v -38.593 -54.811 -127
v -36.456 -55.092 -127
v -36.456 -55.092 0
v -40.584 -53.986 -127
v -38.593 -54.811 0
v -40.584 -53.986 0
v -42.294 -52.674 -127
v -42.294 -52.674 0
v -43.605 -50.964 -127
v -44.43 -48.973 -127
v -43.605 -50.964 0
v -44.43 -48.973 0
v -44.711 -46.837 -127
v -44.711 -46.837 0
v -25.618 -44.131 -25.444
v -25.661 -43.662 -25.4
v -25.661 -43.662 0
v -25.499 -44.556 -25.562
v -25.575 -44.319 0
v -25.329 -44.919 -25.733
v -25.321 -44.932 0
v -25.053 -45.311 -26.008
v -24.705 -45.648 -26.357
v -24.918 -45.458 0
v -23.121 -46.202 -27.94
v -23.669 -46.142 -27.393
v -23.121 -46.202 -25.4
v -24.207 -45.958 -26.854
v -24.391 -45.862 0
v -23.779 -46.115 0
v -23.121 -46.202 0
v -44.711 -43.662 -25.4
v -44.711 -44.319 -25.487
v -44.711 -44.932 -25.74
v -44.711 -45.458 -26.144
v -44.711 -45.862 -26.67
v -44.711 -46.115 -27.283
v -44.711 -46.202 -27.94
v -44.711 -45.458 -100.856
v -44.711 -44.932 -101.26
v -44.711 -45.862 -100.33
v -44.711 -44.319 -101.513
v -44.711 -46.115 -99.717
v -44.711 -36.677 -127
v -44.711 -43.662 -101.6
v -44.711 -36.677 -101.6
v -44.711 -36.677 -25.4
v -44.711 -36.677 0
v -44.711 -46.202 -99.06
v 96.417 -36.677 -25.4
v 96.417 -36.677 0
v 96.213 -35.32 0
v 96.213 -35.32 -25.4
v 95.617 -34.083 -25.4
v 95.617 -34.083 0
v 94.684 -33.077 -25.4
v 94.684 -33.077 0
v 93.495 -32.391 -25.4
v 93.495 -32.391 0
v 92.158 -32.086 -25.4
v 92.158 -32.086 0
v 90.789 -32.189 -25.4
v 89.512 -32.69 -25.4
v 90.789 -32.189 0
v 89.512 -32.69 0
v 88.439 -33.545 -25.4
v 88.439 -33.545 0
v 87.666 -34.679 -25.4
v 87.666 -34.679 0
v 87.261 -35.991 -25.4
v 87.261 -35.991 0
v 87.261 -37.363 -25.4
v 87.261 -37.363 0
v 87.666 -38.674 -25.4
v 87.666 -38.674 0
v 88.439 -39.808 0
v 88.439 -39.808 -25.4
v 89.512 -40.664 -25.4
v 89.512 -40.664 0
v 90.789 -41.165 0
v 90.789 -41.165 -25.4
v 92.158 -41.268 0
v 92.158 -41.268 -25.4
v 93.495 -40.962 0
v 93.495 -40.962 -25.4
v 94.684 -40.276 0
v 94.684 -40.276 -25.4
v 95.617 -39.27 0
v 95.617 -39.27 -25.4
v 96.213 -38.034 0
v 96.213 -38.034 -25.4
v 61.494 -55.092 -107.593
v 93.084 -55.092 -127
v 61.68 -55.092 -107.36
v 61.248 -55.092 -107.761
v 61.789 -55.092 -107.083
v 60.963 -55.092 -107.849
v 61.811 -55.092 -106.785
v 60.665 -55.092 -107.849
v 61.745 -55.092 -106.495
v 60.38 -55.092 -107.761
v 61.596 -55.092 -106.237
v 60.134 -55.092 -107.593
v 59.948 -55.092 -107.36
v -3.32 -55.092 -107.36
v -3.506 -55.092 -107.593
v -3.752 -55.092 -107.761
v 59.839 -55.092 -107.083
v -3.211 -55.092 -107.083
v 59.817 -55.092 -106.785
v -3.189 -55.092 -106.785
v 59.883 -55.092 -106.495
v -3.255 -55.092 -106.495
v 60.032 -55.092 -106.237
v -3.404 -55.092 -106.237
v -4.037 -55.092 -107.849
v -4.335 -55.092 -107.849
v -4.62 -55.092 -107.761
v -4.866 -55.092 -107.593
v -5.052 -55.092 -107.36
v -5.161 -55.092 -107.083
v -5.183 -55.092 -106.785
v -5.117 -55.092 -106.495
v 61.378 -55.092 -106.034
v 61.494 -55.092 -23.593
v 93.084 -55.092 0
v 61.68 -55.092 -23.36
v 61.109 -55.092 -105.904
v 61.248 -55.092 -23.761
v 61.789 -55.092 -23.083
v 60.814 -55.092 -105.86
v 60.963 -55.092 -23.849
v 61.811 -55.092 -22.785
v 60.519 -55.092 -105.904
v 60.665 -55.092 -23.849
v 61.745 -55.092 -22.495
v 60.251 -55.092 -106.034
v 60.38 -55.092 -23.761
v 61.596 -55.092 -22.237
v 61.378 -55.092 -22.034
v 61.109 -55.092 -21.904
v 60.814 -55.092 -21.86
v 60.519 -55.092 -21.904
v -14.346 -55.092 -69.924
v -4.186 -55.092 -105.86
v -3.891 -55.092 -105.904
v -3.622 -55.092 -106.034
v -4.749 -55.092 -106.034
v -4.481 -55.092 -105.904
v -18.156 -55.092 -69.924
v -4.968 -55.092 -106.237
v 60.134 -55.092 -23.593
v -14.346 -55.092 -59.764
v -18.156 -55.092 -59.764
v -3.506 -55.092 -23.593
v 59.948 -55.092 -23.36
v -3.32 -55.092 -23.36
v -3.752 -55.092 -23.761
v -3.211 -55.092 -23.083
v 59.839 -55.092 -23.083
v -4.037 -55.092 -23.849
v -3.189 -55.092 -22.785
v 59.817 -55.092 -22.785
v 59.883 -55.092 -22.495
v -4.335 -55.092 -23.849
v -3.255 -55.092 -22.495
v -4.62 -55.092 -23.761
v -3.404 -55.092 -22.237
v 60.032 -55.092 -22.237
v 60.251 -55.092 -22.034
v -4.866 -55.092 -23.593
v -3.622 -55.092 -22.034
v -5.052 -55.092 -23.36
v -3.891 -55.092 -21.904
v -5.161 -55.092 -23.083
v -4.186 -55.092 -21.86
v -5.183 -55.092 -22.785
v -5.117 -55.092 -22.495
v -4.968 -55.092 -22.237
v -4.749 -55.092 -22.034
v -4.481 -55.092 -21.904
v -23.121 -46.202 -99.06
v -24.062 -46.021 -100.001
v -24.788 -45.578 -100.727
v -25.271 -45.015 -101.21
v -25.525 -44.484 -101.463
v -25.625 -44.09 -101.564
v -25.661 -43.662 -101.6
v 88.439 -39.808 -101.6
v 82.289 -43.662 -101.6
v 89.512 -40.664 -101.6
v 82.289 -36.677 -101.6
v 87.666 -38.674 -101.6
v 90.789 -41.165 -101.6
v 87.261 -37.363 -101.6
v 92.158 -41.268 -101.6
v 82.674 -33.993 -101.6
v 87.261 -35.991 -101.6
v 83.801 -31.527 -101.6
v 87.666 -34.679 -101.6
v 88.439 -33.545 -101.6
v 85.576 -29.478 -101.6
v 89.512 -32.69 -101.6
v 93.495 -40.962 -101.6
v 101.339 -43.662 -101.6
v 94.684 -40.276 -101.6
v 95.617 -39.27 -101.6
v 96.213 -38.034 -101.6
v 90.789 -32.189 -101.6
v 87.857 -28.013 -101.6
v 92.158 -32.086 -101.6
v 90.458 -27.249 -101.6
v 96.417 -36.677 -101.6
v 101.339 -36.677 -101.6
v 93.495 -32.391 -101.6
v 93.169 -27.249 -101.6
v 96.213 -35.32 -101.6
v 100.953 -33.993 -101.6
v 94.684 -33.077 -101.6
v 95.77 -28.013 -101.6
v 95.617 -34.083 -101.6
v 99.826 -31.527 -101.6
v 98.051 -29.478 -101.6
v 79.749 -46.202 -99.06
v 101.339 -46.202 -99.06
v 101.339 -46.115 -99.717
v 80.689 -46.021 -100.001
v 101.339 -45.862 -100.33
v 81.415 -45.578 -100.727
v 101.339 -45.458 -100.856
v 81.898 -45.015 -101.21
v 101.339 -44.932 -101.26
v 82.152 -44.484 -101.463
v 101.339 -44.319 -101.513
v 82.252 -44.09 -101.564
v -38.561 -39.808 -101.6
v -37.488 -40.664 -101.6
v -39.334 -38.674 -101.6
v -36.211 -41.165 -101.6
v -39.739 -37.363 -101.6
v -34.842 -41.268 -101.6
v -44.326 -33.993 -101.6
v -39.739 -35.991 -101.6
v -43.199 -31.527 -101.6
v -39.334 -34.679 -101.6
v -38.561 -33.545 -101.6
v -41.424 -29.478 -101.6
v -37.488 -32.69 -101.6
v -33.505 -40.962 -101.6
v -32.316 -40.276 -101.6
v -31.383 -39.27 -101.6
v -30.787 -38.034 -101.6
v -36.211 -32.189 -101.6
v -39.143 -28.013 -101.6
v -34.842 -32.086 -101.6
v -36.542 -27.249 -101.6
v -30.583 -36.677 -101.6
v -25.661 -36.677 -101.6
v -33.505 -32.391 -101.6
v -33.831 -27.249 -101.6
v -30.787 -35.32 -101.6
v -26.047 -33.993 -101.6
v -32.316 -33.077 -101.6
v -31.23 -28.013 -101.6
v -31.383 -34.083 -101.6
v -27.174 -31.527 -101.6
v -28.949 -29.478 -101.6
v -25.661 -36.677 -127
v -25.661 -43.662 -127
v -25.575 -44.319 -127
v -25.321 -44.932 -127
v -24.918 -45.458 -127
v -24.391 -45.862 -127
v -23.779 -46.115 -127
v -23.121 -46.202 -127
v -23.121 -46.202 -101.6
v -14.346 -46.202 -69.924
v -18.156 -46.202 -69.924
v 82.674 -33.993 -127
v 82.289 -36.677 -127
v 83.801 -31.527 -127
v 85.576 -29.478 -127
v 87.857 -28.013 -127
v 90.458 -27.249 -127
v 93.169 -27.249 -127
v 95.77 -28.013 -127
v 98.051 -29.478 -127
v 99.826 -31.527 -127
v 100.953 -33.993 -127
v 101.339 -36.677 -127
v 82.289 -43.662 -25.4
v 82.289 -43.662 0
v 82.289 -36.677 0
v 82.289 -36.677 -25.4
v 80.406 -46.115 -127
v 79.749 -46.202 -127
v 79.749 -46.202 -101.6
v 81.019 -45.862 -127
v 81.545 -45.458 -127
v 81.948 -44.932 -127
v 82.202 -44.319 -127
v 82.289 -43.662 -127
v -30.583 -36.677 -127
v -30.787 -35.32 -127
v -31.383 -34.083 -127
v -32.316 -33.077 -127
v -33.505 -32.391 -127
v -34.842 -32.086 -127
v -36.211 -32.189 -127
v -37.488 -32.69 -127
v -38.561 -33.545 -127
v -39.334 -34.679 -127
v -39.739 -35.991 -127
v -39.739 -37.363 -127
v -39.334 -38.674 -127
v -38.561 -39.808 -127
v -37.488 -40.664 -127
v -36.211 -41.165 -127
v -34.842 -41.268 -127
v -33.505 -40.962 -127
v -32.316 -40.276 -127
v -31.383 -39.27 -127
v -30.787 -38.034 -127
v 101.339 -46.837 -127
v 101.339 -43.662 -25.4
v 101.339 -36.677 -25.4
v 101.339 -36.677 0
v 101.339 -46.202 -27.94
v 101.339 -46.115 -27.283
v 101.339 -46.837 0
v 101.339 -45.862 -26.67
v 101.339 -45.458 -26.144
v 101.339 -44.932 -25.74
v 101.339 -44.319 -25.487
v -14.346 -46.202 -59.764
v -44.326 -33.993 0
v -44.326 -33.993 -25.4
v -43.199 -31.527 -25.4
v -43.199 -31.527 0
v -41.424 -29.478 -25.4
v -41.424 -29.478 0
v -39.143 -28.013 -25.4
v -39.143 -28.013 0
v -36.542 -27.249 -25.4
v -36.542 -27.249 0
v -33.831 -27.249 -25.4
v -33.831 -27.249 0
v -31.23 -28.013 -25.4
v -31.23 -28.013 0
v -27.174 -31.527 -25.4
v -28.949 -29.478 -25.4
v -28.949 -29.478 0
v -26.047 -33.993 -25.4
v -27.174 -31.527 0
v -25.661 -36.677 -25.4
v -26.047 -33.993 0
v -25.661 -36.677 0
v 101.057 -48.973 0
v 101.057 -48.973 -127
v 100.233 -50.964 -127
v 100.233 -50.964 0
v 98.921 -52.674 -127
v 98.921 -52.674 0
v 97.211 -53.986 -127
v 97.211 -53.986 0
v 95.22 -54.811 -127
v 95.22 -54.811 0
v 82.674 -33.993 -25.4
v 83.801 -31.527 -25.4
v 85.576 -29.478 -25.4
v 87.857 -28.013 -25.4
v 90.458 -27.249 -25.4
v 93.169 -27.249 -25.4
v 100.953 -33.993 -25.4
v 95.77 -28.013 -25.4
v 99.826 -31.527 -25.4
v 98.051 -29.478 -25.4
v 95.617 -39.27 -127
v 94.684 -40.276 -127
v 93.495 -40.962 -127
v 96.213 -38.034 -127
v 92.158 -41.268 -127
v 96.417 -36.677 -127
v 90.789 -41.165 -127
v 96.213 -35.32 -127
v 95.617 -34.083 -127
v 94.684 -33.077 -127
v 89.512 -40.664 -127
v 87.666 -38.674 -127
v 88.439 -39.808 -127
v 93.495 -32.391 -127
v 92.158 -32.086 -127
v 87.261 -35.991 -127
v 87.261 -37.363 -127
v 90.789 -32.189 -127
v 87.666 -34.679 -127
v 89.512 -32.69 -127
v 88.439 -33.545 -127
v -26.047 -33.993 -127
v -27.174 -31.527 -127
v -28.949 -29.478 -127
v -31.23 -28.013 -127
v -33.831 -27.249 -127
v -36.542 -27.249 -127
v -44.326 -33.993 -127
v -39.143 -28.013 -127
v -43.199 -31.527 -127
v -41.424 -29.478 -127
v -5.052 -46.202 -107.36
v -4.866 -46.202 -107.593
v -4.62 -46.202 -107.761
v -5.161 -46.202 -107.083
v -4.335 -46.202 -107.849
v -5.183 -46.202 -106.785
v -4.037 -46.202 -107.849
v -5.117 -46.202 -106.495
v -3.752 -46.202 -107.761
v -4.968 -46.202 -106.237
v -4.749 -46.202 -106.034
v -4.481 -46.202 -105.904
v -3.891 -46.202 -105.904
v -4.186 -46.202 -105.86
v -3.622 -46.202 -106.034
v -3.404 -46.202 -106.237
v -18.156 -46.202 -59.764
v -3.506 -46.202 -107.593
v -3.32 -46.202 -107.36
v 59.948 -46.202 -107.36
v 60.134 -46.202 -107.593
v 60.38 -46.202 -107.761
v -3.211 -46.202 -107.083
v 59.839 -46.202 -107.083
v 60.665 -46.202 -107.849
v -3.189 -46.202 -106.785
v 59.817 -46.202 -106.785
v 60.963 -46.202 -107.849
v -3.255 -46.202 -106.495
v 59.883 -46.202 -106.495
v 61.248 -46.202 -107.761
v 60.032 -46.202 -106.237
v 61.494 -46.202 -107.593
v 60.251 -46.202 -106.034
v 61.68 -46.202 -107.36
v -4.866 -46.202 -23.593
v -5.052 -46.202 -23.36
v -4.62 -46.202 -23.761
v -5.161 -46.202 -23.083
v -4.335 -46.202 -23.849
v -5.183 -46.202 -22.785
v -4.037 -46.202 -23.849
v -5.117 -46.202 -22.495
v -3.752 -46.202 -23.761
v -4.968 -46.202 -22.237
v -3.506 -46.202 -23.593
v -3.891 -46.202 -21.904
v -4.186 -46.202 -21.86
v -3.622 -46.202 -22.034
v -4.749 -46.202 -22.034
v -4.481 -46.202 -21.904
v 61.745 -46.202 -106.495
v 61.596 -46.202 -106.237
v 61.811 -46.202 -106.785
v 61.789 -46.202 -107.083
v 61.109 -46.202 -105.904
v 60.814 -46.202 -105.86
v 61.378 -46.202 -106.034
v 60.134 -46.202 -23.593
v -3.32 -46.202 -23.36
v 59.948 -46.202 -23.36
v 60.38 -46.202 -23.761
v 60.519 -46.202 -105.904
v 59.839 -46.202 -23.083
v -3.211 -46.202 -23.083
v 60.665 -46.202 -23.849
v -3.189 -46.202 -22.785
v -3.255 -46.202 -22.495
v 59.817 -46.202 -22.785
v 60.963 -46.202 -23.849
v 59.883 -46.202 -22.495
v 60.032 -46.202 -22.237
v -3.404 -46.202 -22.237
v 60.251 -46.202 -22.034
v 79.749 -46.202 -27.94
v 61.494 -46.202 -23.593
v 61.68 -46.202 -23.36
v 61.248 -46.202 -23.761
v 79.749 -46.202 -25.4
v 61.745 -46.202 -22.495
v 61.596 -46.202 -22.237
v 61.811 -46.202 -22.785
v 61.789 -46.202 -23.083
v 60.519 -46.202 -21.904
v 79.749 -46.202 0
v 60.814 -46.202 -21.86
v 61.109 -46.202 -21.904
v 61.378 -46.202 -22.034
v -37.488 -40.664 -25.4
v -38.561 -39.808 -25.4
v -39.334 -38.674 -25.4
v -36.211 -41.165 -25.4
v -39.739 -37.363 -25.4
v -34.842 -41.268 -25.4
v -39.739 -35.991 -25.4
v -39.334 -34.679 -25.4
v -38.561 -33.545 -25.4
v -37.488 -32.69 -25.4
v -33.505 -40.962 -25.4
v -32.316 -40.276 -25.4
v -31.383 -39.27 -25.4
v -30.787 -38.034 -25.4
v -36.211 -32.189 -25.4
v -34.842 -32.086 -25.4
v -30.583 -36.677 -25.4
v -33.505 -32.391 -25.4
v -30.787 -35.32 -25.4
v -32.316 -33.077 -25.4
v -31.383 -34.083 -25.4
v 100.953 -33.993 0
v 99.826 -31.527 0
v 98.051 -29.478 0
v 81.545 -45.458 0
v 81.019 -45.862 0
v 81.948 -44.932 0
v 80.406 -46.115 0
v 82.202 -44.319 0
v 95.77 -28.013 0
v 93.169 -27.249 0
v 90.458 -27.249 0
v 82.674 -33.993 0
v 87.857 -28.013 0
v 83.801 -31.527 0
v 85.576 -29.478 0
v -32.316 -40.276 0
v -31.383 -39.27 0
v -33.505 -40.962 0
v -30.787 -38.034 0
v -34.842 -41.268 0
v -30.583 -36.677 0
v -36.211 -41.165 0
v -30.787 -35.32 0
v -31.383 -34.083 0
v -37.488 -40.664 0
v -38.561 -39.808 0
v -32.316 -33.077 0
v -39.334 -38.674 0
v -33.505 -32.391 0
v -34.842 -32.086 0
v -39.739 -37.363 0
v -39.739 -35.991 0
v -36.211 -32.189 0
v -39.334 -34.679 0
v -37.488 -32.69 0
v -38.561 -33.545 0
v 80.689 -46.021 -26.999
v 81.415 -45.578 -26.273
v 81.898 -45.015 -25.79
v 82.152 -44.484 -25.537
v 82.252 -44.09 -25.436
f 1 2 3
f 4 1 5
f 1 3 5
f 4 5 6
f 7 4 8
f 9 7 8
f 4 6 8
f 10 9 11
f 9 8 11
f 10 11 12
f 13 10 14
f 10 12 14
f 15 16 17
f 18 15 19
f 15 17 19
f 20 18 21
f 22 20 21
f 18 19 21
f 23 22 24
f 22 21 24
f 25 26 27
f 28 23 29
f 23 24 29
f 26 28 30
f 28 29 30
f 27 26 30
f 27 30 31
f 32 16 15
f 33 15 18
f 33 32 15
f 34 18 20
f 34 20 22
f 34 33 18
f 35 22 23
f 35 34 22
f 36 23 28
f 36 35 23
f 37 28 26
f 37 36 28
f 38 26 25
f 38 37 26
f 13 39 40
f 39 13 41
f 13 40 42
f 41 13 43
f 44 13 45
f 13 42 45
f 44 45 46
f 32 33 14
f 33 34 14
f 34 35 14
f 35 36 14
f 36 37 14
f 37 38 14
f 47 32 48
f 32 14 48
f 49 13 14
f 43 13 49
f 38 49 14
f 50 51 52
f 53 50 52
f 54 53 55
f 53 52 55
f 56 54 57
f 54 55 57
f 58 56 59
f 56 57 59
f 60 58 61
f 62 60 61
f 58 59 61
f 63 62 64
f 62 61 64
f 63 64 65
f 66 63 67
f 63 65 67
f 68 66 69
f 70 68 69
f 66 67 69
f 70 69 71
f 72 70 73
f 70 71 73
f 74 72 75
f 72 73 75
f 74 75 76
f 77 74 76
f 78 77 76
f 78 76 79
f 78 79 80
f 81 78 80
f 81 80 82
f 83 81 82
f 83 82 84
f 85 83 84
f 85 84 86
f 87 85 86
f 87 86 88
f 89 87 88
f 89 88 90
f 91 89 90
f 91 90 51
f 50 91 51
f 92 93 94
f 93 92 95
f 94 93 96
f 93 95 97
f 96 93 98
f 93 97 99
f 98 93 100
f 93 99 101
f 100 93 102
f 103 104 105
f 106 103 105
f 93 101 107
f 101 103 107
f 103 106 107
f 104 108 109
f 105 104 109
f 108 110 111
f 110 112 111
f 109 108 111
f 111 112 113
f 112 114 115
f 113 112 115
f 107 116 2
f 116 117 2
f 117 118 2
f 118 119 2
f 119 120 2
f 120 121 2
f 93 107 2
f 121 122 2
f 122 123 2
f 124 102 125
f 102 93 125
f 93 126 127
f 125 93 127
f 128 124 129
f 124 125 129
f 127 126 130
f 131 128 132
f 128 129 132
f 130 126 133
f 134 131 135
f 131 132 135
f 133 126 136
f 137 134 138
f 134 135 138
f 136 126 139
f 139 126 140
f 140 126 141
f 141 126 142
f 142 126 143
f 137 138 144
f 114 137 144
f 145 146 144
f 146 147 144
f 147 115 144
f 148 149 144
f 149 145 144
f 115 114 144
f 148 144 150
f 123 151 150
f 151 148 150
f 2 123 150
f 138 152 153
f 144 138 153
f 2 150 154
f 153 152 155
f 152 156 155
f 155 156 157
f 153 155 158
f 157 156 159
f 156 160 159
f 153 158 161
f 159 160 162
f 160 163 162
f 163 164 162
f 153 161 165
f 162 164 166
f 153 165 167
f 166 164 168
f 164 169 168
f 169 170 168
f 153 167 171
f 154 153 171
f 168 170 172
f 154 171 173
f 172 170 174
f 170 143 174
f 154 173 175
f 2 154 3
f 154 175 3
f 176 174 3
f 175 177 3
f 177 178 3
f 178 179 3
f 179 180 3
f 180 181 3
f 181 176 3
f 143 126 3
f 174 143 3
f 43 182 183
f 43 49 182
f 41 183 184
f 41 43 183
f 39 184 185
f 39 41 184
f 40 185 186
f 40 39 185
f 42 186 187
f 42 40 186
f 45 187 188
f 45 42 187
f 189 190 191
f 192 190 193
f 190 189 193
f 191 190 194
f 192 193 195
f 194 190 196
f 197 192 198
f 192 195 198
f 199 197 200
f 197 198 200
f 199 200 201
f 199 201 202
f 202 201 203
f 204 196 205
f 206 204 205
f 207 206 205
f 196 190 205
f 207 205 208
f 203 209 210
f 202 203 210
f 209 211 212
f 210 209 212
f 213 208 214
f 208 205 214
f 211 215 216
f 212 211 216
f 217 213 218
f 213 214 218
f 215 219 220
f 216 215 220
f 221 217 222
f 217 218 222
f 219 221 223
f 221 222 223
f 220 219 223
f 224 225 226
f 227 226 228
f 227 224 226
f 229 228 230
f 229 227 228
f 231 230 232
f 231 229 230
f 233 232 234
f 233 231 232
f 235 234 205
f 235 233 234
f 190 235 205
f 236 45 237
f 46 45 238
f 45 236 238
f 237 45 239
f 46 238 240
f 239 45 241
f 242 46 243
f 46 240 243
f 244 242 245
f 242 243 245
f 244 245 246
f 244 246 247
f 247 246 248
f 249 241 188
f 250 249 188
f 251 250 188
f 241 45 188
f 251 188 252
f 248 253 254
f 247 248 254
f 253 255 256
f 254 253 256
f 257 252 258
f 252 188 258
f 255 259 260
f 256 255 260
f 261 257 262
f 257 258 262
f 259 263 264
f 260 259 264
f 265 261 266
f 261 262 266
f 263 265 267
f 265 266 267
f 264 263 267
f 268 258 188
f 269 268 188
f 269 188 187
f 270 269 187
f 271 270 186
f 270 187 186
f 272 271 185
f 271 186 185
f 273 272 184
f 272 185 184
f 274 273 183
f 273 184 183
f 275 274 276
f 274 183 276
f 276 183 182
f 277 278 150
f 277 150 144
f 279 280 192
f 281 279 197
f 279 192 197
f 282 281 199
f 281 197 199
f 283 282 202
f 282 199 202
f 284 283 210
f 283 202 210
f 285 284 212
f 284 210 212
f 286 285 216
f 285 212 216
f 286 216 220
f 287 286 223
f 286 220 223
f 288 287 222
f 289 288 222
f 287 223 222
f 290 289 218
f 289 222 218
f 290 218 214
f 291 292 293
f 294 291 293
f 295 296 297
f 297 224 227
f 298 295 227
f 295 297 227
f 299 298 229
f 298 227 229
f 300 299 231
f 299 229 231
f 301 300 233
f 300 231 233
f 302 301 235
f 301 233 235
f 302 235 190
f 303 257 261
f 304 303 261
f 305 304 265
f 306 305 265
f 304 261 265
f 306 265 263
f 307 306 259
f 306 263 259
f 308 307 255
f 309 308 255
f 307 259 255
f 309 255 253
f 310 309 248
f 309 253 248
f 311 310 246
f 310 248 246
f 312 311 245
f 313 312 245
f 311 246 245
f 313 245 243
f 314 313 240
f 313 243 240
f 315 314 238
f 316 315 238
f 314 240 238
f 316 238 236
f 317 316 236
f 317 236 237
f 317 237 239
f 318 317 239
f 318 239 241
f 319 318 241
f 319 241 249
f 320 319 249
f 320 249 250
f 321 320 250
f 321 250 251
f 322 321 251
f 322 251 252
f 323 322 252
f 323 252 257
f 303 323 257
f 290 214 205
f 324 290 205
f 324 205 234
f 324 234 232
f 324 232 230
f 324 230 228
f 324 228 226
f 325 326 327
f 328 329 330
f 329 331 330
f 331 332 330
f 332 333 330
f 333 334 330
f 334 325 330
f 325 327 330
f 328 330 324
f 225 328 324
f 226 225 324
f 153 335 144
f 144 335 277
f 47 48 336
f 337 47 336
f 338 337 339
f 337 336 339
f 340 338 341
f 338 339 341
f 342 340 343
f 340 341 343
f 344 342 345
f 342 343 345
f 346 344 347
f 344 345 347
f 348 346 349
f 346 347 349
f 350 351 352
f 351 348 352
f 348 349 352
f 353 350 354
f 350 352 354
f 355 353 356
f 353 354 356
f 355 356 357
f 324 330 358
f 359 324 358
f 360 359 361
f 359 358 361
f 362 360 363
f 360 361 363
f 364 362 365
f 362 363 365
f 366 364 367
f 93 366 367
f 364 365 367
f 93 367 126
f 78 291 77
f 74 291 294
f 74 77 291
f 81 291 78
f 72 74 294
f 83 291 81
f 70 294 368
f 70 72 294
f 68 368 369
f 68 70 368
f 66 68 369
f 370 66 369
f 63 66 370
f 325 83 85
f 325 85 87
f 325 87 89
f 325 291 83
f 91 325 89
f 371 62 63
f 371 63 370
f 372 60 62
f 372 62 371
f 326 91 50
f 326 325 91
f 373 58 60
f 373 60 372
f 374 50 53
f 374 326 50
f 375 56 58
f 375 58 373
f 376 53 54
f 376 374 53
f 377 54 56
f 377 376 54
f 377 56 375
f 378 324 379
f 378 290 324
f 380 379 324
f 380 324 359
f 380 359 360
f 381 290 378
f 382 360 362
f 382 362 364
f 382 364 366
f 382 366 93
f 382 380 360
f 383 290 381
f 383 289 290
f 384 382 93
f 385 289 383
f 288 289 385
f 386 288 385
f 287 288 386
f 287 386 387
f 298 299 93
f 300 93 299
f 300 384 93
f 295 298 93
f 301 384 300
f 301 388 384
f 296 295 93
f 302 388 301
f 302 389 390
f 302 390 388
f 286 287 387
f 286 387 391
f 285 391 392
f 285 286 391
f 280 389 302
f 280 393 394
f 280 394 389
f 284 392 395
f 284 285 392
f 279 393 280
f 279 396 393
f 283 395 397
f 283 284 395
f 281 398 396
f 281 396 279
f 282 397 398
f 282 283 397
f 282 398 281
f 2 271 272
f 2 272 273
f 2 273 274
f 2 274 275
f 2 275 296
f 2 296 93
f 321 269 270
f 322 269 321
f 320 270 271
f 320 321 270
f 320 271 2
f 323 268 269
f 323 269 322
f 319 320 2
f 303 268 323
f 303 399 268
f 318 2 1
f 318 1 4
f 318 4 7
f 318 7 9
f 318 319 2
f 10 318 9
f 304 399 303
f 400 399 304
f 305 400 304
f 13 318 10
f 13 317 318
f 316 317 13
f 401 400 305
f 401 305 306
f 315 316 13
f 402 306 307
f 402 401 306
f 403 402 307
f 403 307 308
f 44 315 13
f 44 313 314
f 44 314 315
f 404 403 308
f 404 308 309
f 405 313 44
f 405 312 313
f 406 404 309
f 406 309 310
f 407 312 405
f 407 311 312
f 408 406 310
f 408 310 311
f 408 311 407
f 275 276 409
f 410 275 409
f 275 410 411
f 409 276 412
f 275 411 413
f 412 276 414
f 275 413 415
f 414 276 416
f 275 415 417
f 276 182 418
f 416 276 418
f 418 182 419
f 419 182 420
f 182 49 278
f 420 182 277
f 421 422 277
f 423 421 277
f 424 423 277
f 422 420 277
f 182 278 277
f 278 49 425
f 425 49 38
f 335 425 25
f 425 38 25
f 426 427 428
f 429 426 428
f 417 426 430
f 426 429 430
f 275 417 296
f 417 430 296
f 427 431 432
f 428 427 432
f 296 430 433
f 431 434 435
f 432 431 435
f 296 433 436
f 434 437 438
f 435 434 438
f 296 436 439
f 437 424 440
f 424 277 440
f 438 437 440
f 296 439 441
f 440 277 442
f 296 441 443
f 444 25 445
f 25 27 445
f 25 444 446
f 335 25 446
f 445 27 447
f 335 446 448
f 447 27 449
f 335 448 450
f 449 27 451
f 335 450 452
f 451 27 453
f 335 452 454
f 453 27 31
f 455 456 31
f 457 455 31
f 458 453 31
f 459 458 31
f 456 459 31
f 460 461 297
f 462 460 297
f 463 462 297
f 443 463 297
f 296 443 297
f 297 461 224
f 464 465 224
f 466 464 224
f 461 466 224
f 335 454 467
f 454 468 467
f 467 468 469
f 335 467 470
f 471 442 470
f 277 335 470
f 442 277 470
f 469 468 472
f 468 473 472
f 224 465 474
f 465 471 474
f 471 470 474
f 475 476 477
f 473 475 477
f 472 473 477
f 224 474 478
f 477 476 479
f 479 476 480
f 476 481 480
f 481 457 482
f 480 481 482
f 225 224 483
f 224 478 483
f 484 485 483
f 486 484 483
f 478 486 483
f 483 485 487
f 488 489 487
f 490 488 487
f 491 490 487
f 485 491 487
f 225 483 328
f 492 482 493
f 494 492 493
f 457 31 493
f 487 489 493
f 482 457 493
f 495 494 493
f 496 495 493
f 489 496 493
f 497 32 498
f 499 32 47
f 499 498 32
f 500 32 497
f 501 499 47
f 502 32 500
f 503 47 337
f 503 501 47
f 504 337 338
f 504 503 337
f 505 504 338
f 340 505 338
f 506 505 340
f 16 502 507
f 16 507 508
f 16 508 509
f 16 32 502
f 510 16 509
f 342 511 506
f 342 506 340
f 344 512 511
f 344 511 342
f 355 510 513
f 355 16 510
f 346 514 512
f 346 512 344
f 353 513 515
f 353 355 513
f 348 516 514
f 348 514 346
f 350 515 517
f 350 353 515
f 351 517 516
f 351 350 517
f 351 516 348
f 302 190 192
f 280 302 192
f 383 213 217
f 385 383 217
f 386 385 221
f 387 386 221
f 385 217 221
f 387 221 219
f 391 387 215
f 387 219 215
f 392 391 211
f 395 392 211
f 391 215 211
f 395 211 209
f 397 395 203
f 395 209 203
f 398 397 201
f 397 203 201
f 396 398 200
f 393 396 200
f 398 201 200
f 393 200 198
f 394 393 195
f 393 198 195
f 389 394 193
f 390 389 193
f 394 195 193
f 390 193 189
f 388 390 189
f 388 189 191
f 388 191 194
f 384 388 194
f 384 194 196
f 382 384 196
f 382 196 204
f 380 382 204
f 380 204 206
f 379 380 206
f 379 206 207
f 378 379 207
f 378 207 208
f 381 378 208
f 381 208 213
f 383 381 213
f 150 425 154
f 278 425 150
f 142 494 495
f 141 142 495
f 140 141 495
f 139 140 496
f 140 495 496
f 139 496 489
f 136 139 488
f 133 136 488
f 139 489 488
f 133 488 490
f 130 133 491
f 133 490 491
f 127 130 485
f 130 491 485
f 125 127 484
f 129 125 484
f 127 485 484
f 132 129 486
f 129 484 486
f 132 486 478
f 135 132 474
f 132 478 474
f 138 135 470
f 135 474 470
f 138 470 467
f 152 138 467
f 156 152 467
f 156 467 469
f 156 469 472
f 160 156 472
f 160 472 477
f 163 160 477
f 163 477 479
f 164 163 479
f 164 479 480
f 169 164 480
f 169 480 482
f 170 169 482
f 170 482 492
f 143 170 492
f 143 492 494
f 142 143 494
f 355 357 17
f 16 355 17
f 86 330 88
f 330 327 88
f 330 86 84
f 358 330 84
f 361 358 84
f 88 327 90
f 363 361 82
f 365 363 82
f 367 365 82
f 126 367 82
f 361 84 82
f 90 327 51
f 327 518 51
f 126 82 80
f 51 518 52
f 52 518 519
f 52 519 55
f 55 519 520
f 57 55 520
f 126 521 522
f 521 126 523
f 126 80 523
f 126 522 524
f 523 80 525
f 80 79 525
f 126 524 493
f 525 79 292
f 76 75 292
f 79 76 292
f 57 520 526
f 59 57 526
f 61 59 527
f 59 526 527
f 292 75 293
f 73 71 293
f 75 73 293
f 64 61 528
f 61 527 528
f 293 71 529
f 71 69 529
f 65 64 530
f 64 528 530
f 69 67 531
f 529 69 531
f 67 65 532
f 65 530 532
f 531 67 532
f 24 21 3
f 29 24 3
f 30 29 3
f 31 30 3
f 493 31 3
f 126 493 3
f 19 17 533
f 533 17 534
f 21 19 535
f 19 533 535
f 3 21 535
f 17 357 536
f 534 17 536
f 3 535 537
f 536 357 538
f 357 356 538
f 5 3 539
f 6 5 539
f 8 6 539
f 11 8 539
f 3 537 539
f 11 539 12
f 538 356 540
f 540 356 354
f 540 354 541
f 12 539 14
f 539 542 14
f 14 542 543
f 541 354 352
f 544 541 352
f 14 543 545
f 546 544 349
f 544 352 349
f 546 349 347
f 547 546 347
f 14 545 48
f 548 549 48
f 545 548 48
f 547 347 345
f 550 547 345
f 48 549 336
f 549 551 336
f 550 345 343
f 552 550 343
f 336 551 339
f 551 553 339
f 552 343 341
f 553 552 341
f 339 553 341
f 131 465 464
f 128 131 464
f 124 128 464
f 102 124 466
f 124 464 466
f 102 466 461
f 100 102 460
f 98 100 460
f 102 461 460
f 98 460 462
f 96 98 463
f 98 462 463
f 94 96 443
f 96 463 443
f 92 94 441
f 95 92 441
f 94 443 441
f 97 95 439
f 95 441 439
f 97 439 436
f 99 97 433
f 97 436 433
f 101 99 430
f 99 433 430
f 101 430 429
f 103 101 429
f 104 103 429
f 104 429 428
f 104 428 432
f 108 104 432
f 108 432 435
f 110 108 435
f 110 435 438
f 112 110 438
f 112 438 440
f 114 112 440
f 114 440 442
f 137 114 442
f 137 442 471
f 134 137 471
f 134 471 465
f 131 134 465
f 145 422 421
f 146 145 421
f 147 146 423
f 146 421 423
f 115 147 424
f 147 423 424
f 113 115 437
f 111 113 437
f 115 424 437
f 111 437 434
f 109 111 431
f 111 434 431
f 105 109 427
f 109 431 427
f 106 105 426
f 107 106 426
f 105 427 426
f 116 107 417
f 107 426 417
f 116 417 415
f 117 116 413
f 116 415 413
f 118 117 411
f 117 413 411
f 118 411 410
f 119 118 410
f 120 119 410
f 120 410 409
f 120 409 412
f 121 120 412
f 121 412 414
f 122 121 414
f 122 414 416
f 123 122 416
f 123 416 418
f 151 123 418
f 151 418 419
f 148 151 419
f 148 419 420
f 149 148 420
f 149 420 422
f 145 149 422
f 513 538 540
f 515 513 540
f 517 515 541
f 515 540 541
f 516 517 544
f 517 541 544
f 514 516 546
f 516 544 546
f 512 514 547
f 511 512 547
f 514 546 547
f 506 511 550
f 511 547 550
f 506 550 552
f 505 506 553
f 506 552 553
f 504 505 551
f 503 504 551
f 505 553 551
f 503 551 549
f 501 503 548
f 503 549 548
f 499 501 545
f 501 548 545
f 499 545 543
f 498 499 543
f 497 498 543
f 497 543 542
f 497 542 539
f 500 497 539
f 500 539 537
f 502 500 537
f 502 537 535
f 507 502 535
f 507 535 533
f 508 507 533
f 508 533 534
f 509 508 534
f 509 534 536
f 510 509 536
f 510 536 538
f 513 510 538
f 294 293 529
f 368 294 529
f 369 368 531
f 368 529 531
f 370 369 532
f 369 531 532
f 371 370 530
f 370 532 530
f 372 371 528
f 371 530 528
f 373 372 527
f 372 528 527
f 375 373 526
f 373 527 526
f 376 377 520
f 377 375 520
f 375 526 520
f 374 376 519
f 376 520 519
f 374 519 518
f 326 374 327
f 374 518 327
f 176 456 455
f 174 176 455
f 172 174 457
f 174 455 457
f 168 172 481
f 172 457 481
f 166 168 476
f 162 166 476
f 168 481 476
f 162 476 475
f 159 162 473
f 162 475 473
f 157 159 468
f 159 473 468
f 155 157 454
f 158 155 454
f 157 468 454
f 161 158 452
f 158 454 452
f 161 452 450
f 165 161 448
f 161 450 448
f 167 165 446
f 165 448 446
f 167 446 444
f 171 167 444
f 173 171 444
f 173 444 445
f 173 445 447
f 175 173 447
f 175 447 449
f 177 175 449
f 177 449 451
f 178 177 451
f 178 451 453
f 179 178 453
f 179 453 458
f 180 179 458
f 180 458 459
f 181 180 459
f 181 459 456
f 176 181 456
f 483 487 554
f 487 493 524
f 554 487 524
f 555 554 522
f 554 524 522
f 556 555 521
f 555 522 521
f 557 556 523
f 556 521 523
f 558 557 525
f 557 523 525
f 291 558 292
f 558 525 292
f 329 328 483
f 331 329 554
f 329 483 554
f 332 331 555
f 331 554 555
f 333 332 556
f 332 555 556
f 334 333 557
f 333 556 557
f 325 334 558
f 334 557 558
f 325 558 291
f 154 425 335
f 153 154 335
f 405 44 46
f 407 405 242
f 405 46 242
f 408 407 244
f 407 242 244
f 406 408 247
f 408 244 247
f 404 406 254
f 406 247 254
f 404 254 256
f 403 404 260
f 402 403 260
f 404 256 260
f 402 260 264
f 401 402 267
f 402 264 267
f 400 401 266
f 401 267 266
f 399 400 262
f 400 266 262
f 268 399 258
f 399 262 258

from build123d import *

# Parameters (mm, degrees)
SKETCH2_R           = 4.60375
BOSS_EXTRUDE1_DEPTH = 127
SKETCH3_W           = 76.2
SKETCH3_H           = 31.474420728
CUT_EXTRUDE1_DEPTH  = 254
FILLET1_R           = 2.54
FILLET2_R           = 2.54
FILLET3_R           = 2.54
FILLET4_R           = 2.54
SKETCH4_R           = 1
SKETCH4_W           = 3.81
SKETCH4_H           = 10.16
CUT_EXTRUDE2_DEPTH  = 254


with BuildPart() as part:
    # Sketch2 → Boss-Extrude1 (new body)
    with BuildSketch(Plane.XY):
        with BuildLine():
            Line((-25.661451909, -36.676833639), (-25.661451909, -43.661833639))
            ThreePointArc((-25.661451909, -43.661833639), (-24.917503133, -45.457884863), (-23.121451909, -46.201833639))
            Line((-23.121451909, -46.201833639), (79.748548091, -46.201833639))
            ThreePointArc((79.748548091, -46.201833639), (81.544599316, -45.457884863), (82.288548091, -43.661833639))
            Line((82.288548091, -43.661833639), (82.288548091, -36.676833639))
            ThreePointArc((82.288548091, -36.676833639), (91.813548091, -27.151833639), (101.338548091, -36.676833639))
            Line((101.338548091, -36.676833639), (101.338548091, -46.201833639))
            Line((101.338548091, -46.201833639), (101.338548091, -46.836833639))
            ThreePointArc((101.338548091, -46.836833639), (98.92071457, -52.674000118), (93.083548091, -55.091833639))
            Line((93.083548091, -55.091833639), (-36.456451909, -55.091833639))
            ThreePointArc((-36.456451909, -55.091833639), (-42.293618387, -52.674000118), (-44.711451909, -46.836833639))
            Line((-44.711451909, -46.836833639), (-44.711451909, -46.201833639))
            Line((-44.711451909, -46.201833639), (-44.711451909, -36.676833639))
            ThreePointArc((-44.711451909, -36.676833639), (-35.186451909, -27.151833639), (-25.661451909, -36.676833639))
        make_face()
        with Locations((-35.186451909, -36.676833639)):
            Circle(SKETCH2_R, mode=Mode.SUBTRACT)
        with Locations((91.813548091, -36.676833639)):
            Circle(SKETCH2_R, mode=Mode.SUBTRACT)
    extrude(amount=-BOSS_EXTRUDE1_DEPTH)

    # Sketch3 → Cut-Extrude1 (cut)
    with BuildSketch(Plane(origin=(101.338548091, 0, 0), x_dir=(0, 0, -1), z_dir=(1, 0, 0))):
        with Locations((63.5, -30.464623275)):
            Rectangle(SKETCH3_W, SKETCH3_H)
    extrude(amount=-CUT_EXTRUDE1_DEPTH, mode=Mode.SUBTRACT)

    # Fillet1
    fillet1_edges = [part.edges().sort_by_distance(p)[0] for p in [
        (-33.916451909, -46.201833639, -25.4),
    ]]
    fillet(fillet1_edges, radius=FILLET1_R)

    # Fillet2
    fillet2_edges = [part.edges().sort_by_distance(p)[0] for p in [
        (-33.916451909, -46.201833639, -101.6),
    ]]
    fillet(fillet2_edges, radius=FILLET2_R)

    # Fillet3
    fillet3_edges = [part.edges().sort_by_distance(p)[0] for p in [
        (90.543548091, -46.201833639, -101.6),
    ]]
    fillet(fillet3_edges, radius=FILLET3_R)

    # Fillet4
    fillet4_edges = [part.edges().sort_by_distance(p)[0] for p in [
        (90.543548091, -46.201833639, -25.4),
    ]]
    fillet(fillet4_edges, radius=FILLET4_R)

    # Sketch4 → Cut-Extrude2 (cut)
    with BuildSketch(Plane(origin=(0, -46.201833639, 0), x_dir=(1, 0, 0), z_dir=(0, 1, 0))):
        with Locations(Location((-4.185751909, 106.86, 0), (0, 0, 270))):
            Circle(SKETCH4_R)
        with Locations(Location((60.814248091, 106.86, 0), (0, 0, 270))):
            Circle(SKETCH4_R)
        with Locations(Location((-4.185751909, 22.86, 0), (0, 0, 270))):
            Circle(SKETCH4_R)
        with Locations(Location((60.814248091, 22.86, 0), (0, 0, 270))):
            Circle(SKETCH4_R)
        with Locations((-16.250739794, 64.844309946)):
            Rectangle(SKETCH4_W, SKETCH4_H)
    extrude(amount=-CUT_EXTRUDE2_DEPTH, mode=Mode.SUBTRACT)


solid = part.part
